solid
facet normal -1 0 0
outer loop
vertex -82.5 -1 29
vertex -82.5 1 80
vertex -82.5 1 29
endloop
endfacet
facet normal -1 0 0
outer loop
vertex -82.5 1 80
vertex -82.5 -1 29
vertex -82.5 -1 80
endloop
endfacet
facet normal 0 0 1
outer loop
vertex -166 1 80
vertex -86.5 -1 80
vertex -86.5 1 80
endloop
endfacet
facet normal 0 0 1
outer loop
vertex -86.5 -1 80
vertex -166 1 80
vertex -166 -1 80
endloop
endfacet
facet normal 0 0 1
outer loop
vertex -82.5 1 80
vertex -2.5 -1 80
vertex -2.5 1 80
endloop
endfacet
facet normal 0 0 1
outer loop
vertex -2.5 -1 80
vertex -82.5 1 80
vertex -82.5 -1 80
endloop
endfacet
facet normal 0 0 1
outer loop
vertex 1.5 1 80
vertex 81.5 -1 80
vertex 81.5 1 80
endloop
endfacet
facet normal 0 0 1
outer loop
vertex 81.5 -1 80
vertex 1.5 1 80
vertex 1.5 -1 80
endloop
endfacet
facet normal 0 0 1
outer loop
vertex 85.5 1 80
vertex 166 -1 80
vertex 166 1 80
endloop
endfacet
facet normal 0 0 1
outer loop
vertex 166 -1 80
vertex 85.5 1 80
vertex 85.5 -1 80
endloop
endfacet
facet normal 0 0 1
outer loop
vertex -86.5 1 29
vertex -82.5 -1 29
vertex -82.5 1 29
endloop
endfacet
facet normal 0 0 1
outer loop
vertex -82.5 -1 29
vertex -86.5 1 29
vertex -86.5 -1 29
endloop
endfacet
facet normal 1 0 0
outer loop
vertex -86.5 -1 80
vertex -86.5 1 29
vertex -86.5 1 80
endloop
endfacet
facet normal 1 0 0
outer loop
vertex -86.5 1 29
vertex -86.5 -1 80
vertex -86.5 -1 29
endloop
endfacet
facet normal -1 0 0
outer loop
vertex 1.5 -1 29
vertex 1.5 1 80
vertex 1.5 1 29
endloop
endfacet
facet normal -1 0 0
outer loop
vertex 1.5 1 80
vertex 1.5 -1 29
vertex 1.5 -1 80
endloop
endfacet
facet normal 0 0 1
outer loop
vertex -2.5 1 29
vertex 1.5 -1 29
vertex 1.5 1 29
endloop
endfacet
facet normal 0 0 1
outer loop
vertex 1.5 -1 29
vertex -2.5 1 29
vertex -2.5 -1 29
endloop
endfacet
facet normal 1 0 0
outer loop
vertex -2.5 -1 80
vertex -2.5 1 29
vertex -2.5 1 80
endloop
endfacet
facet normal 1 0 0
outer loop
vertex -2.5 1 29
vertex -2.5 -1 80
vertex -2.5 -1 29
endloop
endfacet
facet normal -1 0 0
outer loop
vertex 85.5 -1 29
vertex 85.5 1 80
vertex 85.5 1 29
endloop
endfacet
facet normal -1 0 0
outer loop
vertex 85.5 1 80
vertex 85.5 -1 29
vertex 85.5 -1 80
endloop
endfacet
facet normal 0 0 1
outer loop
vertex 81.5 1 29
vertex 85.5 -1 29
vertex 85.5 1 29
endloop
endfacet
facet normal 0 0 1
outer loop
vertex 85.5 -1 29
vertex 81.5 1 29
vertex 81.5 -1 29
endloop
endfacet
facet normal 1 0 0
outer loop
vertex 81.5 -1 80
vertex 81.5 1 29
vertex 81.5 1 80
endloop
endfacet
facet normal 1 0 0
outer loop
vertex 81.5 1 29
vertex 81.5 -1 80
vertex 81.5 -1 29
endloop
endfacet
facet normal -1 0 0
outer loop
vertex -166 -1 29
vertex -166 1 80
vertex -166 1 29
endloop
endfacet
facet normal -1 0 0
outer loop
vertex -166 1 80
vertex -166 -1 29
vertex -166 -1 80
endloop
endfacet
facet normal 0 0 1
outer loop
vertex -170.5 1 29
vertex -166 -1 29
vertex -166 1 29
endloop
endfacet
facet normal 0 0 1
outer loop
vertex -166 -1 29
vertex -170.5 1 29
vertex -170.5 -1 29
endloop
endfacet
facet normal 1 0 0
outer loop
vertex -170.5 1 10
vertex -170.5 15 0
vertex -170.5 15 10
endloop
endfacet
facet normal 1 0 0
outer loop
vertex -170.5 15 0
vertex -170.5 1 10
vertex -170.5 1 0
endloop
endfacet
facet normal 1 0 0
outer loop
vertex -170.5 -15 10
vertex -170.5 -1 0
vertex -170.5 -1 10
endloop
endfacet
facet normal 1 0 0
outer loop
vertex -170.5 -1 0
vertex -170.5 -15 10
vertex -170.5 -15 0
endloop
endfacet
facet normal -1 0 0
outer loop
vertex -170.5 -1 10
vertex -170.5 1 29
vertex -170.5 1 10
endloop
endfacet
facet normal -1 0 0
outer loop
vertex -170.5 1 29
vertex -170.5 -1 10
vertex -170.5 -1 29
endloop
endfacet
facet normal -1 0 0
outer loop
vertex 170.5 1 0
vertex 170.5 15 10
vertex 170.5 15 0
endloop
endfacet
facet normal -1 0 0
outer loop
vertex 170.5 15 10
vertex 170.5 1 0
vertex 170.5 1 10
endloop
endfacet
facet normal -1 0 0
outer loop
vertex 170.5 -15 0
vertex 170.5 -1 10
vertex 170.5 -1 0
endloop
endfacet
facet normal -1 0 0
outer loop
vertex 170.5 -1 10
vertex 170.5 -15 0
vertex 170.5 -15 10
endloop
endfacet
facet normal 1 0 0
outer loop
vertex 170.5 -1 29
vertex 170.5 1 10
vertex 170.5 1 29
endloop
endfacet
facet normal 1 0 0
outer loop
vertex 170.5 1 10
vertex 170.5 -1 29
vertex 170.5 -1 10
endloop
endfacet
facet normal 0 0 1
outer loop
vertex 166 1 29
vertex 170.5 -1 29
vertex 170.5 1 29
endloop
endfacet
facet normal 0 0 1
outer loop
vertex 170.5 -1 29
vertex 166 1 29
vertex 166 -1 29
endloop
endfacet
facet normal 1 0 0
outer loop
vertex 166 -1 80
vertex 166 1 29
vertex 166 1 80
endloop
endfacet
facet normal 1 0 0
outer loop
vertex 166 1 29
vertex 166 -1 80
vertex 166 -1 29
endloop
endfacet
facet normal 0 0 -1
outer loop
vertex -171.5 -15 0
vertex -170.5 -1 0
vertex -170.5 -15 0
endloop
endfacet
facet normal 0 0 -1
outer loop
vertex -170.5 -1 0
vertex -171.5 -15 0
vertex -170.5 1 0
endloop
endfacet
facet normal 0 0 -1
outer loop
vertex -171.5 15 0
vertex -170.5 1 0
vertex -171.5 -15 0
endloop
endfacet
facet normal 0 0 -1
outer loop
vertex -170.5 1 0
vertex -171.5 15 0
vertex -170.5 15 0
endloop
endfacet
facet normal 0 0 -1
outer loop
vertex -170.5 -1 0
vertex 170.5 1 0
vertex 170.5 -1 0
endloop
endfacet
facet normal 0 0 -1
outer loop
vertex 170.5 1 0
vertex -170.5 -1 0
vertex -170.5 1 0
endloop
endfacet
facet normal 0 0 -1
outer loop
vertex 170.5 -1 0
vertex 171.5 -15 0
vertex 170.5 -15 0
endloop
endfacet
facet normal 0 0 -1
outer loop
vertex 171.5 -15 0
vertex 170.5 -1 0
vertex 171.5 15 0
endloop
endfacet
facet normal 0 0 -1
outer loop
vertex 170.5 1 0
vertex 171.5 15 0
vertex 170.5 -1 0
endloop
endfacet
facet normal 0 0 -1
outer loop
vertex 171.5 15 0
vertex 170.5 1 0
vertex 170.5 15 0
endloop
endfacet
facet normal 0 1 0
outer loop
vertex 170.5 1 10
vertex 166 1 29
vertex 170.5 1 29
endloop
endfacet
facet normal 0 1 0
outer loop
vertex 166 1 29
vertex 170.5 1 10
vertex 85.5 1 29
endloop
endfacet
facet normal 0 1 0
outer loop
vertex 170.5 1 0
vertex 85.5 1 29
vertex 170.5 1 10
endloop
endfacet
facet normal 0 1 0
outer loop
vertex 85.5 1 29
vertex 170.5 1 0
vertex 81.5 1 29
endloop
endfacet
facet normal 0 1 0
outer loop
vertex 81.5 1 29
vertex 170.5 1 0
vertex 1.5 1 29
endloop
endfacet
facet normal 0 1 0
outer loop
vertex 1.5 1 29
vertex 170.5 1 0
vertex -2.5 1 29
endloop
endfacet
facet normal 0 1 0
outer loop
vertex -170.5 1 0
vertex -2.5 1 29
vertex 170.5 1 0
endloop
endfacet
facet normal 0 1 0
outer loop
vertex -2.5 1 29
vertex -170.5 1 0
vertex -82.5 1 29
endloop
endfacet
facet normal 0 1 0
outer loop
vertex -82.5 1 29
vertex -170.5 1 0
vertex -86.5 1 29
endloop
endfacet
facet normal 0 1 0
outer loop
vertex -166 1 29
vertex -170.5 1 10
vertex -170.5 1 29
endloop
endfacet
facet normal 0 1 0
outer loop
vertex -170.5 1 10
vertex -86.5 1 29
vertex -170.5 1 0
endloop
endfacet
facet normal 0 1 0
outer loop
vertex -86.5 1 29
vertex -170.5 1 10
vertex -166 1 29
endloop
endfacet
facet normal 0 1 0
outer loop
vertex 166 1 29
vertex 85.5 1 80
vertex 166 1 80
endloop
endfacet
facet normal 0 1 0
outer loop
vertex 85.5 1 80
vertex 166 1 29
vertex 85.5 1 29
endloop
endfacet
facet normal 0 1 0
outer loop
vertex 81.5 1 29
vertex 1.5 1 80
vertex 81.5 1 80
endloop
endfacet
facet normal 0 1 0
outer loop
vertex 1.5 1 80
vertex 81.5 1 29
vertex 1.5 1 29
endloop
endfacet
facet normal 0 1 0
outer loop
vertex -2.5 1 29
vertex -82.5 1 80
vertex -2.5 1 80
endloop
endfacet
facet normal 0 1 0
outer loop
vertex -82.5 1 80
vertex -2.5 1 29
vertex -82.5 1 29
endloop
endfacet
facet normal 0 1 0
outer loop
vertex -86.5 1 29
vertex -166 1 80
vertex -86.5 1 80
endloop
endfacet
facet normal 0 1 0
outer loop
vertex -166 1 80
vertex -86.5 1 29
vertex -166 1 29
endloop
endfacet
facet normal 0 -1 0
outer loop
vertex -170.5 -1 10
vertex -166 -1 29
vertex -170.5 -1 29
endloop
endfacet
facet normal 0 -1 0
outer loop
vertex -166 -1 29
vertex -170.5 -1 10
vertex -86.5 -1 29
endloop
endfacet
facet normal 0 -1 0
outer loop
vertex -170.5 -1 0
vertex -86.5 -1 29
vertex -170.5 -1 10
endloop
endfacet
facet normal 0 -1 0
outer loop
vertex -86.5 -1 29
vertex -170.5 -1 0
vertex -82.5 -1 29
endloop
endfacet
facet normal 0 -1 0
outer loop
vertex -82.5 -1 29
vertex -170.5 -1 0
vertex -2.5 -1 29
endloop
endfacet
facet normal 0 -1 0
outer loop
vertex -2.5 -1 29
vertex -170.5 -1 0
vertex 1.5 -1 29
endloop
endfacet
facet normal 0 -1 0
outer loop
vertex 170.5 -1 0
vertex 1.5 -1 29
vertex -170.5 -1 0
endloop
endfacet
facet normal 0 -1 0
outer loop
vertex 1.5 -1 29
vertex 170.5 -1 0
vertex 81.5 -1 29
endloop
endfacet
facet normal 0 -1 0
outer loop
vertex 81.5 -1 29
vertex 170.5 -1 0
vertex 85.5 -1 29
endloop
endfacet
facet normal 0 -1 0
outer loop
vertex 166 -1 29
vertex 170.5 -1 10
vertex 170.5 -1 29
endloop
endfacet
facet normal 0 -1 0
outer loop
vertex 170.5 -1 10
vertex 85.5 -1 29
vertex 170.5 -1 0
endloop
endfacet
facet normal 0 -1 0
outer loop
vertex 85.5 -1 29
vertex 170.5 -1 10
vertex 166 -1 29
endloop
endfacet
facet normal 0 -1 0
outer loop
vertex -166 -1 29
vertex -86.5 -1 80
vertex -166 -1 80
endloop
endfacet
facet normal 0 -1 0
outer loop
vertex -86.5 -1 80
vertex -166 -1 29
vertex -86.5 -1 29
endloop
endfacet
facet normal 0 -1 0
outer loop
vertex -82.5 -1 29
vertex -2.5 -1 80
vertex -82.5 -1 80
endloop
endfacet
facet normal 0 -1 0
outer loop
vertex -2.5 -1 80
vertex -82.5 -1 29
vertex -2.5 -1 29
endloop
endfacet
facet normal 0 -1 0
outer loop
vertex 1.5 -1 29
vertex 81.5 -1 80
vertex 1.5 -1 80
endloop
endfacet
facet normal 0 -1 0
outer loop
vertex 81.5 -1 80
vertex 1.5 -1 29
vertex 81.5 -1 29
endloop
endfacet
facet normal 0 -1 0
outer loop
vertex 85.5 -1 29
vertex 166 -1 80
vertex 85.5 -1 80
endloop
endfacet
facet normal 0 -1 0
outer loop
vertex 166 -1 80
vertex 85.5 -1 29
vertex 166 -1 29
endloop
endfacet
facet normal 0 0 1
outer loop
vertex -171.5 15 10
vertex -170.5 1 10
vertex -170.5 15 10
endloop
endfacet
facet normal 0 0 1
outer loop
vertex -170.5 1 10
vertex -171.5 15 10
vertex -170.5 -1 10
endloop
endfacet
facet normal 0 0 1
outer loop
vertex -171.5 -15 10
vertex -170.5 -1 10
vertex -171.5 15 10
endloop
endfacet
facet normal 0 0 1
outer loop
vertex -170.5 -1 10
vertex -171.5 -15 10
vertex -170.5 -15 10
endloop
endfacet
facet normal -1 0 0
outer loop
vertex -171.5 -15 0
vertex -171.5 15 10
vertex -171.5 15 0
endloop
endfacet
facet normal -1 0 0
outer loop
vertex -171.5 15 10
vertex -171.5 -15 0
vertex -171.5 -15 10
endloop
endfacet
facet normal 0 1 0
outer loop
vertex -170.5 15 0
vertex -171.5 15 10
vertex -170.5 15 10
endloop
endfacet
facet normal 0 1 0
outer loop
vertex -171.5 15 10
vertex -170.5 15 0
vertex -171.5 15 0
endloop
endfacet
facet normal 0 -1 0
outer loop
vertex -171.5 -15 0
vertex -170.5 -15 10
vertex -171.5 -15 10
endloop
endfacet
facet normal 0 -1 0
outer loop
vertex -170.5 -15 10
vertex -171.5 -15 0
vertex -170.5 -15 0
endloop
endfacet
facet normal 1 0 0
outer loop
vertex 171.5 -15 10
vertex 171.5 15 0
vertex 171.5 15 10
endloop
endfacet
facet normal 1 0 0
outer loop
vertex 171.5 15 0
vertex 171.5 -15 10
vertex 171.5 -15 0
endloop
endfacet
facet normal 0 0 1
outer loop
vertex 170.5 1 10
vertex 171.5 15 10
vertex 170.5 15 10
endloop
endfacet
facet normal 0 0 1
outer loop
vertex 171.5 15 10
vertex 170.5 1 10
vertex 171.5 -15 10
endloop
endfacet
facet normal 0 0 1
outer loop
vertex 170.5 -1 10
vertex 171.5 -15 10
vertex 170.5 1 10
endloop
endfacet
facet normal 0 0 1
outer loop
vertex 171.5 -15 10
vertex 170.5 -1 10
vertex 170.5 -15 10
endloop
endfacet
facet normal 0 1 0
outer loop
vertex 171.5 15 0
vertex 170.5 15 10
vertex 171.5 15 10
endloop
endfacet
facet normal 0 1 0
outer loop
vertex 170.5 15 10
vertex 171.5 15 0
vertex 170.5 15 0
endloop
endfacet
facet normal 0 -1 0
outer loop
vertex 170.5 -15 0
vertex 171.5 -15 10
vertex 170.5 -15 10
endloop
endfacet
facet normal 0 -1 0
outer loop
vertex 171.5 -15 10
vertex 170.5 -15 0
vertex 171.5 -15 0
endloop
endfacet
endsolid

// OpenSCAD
drawerWidth = 100;
drawerDepth = 300;
dividerHeight = 80;
dividerBaseWidth = 4;
dividerTopWidth = 2;
slotSpacing = 80;
slotHeight = 30;
slotWidth = 2.5;

defaultThickness = 1;


module dividerEndBase(debOuterWidth = 30, 
                      debInnerWidth = 10, 
                      debThickness = defaultThickness) {

    translate([0, (debInnerWidth / 2), debThickness / 2]) 
      cube([debOuterWidth, debInnerWidth, debThickness], center = true);

    translate([0, debOuterWidth / 2, debThickness / 2]) 
      cube([debInnerWidth, debOuterWidth, debThickness], center = true);
    
    zAngle = atan((debOuterWidth - debInnerWidth) / (debOuterWidth - debInnerWidth) / 2);
    base = (debOuterWidth - debInnerWidth) / 2;
    hypotenuse = sqrt(pow(debOuterWidth - debInnerWidth, 2) + pow(base, 2));
    
    translate([-(debInnerWidth + ((debOuterWidth - debInnerWidth) / 2)) / 2, debInnerWidth + ((debOuterWidth - debInnerWidth) / 2), debThickness / 2]) rotate([0, 0, -zAngle]) translate([base / 2, 0, 0]) cube([base, hypotenuse, debThickness], center = true);

    translate([(debInnerWidth + ((debOuterWidth - debInnerWidth) / 2)) / 2, debInnerWidth + ((debOuterWidth - debInnerWidth) / 2), debThickness / 2]) rotate([0, 0, zAngle]) translate([-base / 2, 0, 0]) cube([base, hypotenuse, debThickness], center = true);                          
};

module dividerEnd(deHeight = 10, deDepth = 10, deWidth = 30, deThickness = defaultThickness) {
    translate([0, 0, 0]) dividerEndBase();
    translate([0, (deThickness / 2), deHeight / 2]) cube([deWidth, deThickness, deHeight], center = true);
};

module dividerBody(dbLength, dbHeight, dbBaseWidth = dividerBaseWidth, dbTopWidth = dividerTopWidth, dbBaseHeight = 10) {
    
    translate([0, 0, dbBaseHeight / 2]) cube([dbBaseWidth, dbLength, dbBaseHeight], center = true);
    translate([0, 0, dbBaseHeight + ((dbHeight - dbBaseHeight) / 2)]) cube([dbTopWidth, dbLength, dbHeight - dbBaseHeight], center = true);
    
    zAngle = atan((dbBaseWidth - dbTopWidth) / 2 / (dbHeight - dbBaseHeight));
    base = (dbBaseWidth - dbTopWidth) / 2;
    hypotenuse = sqrt(pow(dbHeight - dbBaseHeight, 2) + pow(base, 2));
    
    translate([dbBaseWidth - dbTopWidth, 0, dbBaseHeight + ((dbHeight - dbBaseHeight) / 2)]) 
    rotate([0, 90 - zAngle, 0]) 
    translate([0, 0, -base])
    cube([hypotenuse, dbLength, base], center = true);

    translate([-(dbBaseWidth - dbTopWidth), 0, dbBaseHeight + ((dbHeight - dbBaseHeight) / 2)]) 
    rotate([0, 90 + zAngle, 0]) 
    translate([0, 0, base])
    cube([hypotenuse, dbLength, base], center = true);

};

module verticalDivider(vdLength = drawerDepth, vdHeight = dividerHeight, vdSlotSpacing = slotSpacing, vdSlotWidth = slotWidth, vdSlotHeight = slotHeight) {
    difference() {
        union() {
            translate([0, - vdLength / 2, 0]) dividerEnd();
            dividerBody(vdLength, vdHeight);
            translate([0, vdLength / 2, 0]) rotate([0, 0, 180]) dividerEnd();
        };
        union() {
            slotCount = floor(vdLength / vdSlotSpacing) + 1;
            initialOffset = - (vdLength / 2) + (vdLength - ((slotCount - 1) * vdSlotSpacing)) / 2;
            for( slotNo = [ 0 : slotCount - 1]) {
                translate([0, initialOffset + (slotNo * vdSlotSpacing), vdHeight - (vdSlotHeight / 2)]) cube([dividerBaseWidth, vdSlotWidth, vdSlotHeight], center = true);
            };
        };
    };
};


module horizontalDivider(hdSlotCount, hdHeight = dividerHeight, hdWidth = dividerTopWidth, hdSlotSpacing = slotSpacing, hdSlotWidth = dividerBaseWidth, hdSlotHeight = dividerHeight - slotHeight + 1, hdEndThickness = defaultThickness, hdEndWidth = 30, hdEndHeight = 10) {
    
    length = (hdSlotSpacing * (hdSlotCount + 1)) + (hdSlotWidth * (hdSlotCount + 2)) + hdEndThickness;
    
    translate([- (length + hdEndThickness) / 2, 0, hdEndHeight / 2]) 
      cube([hdEndThickness, hdEndWidth, hdEndHeight], center = true);
    
    translate([0, 0, hdHeight / 2]) difference() {
        cube([length, hdWidth, hdHeight], center = true);
        translate([0, 0, (hdHeight - hdSlotHeight) / 2]) union() {
            translate([((hdSlotWidth + (hdEndThickness / 2)) / 2) - (length / 2), 0, 0]) cube([hdSlotWidth + (hdEndThickness / 2), hdSlotWidth, hdSlotHeight], center = true);
            for( slotNo = [ 1 : hdSlotCount]) {
                translate([(slotNo * (hdSlotSpacing + hdSlotWidth)) + (hdSlotWidth / 2) - (length / 2), 0, 0]) cube([hdSlotWidth, hdSlotWidth, hdSlotHeight], center = true);
            };
            translate([- ((hdSlotWidth + (hdEndThickness / 2)) / 2) + (length / 2), 0, 0]) cube([hdSlotWidth + (hdEndThickness / 2), hdSlotWidth, hdSlotHeight], center = true);
        };
    };
    
    translate([(length + hdEndThickness) / 2, 0, hdEndHeight / 2]) 
      cube([hdEndThickness, hdEndWidth, hdEndHeight], center = true);
};


horizontalDivider(3);
//verticalDivider();
